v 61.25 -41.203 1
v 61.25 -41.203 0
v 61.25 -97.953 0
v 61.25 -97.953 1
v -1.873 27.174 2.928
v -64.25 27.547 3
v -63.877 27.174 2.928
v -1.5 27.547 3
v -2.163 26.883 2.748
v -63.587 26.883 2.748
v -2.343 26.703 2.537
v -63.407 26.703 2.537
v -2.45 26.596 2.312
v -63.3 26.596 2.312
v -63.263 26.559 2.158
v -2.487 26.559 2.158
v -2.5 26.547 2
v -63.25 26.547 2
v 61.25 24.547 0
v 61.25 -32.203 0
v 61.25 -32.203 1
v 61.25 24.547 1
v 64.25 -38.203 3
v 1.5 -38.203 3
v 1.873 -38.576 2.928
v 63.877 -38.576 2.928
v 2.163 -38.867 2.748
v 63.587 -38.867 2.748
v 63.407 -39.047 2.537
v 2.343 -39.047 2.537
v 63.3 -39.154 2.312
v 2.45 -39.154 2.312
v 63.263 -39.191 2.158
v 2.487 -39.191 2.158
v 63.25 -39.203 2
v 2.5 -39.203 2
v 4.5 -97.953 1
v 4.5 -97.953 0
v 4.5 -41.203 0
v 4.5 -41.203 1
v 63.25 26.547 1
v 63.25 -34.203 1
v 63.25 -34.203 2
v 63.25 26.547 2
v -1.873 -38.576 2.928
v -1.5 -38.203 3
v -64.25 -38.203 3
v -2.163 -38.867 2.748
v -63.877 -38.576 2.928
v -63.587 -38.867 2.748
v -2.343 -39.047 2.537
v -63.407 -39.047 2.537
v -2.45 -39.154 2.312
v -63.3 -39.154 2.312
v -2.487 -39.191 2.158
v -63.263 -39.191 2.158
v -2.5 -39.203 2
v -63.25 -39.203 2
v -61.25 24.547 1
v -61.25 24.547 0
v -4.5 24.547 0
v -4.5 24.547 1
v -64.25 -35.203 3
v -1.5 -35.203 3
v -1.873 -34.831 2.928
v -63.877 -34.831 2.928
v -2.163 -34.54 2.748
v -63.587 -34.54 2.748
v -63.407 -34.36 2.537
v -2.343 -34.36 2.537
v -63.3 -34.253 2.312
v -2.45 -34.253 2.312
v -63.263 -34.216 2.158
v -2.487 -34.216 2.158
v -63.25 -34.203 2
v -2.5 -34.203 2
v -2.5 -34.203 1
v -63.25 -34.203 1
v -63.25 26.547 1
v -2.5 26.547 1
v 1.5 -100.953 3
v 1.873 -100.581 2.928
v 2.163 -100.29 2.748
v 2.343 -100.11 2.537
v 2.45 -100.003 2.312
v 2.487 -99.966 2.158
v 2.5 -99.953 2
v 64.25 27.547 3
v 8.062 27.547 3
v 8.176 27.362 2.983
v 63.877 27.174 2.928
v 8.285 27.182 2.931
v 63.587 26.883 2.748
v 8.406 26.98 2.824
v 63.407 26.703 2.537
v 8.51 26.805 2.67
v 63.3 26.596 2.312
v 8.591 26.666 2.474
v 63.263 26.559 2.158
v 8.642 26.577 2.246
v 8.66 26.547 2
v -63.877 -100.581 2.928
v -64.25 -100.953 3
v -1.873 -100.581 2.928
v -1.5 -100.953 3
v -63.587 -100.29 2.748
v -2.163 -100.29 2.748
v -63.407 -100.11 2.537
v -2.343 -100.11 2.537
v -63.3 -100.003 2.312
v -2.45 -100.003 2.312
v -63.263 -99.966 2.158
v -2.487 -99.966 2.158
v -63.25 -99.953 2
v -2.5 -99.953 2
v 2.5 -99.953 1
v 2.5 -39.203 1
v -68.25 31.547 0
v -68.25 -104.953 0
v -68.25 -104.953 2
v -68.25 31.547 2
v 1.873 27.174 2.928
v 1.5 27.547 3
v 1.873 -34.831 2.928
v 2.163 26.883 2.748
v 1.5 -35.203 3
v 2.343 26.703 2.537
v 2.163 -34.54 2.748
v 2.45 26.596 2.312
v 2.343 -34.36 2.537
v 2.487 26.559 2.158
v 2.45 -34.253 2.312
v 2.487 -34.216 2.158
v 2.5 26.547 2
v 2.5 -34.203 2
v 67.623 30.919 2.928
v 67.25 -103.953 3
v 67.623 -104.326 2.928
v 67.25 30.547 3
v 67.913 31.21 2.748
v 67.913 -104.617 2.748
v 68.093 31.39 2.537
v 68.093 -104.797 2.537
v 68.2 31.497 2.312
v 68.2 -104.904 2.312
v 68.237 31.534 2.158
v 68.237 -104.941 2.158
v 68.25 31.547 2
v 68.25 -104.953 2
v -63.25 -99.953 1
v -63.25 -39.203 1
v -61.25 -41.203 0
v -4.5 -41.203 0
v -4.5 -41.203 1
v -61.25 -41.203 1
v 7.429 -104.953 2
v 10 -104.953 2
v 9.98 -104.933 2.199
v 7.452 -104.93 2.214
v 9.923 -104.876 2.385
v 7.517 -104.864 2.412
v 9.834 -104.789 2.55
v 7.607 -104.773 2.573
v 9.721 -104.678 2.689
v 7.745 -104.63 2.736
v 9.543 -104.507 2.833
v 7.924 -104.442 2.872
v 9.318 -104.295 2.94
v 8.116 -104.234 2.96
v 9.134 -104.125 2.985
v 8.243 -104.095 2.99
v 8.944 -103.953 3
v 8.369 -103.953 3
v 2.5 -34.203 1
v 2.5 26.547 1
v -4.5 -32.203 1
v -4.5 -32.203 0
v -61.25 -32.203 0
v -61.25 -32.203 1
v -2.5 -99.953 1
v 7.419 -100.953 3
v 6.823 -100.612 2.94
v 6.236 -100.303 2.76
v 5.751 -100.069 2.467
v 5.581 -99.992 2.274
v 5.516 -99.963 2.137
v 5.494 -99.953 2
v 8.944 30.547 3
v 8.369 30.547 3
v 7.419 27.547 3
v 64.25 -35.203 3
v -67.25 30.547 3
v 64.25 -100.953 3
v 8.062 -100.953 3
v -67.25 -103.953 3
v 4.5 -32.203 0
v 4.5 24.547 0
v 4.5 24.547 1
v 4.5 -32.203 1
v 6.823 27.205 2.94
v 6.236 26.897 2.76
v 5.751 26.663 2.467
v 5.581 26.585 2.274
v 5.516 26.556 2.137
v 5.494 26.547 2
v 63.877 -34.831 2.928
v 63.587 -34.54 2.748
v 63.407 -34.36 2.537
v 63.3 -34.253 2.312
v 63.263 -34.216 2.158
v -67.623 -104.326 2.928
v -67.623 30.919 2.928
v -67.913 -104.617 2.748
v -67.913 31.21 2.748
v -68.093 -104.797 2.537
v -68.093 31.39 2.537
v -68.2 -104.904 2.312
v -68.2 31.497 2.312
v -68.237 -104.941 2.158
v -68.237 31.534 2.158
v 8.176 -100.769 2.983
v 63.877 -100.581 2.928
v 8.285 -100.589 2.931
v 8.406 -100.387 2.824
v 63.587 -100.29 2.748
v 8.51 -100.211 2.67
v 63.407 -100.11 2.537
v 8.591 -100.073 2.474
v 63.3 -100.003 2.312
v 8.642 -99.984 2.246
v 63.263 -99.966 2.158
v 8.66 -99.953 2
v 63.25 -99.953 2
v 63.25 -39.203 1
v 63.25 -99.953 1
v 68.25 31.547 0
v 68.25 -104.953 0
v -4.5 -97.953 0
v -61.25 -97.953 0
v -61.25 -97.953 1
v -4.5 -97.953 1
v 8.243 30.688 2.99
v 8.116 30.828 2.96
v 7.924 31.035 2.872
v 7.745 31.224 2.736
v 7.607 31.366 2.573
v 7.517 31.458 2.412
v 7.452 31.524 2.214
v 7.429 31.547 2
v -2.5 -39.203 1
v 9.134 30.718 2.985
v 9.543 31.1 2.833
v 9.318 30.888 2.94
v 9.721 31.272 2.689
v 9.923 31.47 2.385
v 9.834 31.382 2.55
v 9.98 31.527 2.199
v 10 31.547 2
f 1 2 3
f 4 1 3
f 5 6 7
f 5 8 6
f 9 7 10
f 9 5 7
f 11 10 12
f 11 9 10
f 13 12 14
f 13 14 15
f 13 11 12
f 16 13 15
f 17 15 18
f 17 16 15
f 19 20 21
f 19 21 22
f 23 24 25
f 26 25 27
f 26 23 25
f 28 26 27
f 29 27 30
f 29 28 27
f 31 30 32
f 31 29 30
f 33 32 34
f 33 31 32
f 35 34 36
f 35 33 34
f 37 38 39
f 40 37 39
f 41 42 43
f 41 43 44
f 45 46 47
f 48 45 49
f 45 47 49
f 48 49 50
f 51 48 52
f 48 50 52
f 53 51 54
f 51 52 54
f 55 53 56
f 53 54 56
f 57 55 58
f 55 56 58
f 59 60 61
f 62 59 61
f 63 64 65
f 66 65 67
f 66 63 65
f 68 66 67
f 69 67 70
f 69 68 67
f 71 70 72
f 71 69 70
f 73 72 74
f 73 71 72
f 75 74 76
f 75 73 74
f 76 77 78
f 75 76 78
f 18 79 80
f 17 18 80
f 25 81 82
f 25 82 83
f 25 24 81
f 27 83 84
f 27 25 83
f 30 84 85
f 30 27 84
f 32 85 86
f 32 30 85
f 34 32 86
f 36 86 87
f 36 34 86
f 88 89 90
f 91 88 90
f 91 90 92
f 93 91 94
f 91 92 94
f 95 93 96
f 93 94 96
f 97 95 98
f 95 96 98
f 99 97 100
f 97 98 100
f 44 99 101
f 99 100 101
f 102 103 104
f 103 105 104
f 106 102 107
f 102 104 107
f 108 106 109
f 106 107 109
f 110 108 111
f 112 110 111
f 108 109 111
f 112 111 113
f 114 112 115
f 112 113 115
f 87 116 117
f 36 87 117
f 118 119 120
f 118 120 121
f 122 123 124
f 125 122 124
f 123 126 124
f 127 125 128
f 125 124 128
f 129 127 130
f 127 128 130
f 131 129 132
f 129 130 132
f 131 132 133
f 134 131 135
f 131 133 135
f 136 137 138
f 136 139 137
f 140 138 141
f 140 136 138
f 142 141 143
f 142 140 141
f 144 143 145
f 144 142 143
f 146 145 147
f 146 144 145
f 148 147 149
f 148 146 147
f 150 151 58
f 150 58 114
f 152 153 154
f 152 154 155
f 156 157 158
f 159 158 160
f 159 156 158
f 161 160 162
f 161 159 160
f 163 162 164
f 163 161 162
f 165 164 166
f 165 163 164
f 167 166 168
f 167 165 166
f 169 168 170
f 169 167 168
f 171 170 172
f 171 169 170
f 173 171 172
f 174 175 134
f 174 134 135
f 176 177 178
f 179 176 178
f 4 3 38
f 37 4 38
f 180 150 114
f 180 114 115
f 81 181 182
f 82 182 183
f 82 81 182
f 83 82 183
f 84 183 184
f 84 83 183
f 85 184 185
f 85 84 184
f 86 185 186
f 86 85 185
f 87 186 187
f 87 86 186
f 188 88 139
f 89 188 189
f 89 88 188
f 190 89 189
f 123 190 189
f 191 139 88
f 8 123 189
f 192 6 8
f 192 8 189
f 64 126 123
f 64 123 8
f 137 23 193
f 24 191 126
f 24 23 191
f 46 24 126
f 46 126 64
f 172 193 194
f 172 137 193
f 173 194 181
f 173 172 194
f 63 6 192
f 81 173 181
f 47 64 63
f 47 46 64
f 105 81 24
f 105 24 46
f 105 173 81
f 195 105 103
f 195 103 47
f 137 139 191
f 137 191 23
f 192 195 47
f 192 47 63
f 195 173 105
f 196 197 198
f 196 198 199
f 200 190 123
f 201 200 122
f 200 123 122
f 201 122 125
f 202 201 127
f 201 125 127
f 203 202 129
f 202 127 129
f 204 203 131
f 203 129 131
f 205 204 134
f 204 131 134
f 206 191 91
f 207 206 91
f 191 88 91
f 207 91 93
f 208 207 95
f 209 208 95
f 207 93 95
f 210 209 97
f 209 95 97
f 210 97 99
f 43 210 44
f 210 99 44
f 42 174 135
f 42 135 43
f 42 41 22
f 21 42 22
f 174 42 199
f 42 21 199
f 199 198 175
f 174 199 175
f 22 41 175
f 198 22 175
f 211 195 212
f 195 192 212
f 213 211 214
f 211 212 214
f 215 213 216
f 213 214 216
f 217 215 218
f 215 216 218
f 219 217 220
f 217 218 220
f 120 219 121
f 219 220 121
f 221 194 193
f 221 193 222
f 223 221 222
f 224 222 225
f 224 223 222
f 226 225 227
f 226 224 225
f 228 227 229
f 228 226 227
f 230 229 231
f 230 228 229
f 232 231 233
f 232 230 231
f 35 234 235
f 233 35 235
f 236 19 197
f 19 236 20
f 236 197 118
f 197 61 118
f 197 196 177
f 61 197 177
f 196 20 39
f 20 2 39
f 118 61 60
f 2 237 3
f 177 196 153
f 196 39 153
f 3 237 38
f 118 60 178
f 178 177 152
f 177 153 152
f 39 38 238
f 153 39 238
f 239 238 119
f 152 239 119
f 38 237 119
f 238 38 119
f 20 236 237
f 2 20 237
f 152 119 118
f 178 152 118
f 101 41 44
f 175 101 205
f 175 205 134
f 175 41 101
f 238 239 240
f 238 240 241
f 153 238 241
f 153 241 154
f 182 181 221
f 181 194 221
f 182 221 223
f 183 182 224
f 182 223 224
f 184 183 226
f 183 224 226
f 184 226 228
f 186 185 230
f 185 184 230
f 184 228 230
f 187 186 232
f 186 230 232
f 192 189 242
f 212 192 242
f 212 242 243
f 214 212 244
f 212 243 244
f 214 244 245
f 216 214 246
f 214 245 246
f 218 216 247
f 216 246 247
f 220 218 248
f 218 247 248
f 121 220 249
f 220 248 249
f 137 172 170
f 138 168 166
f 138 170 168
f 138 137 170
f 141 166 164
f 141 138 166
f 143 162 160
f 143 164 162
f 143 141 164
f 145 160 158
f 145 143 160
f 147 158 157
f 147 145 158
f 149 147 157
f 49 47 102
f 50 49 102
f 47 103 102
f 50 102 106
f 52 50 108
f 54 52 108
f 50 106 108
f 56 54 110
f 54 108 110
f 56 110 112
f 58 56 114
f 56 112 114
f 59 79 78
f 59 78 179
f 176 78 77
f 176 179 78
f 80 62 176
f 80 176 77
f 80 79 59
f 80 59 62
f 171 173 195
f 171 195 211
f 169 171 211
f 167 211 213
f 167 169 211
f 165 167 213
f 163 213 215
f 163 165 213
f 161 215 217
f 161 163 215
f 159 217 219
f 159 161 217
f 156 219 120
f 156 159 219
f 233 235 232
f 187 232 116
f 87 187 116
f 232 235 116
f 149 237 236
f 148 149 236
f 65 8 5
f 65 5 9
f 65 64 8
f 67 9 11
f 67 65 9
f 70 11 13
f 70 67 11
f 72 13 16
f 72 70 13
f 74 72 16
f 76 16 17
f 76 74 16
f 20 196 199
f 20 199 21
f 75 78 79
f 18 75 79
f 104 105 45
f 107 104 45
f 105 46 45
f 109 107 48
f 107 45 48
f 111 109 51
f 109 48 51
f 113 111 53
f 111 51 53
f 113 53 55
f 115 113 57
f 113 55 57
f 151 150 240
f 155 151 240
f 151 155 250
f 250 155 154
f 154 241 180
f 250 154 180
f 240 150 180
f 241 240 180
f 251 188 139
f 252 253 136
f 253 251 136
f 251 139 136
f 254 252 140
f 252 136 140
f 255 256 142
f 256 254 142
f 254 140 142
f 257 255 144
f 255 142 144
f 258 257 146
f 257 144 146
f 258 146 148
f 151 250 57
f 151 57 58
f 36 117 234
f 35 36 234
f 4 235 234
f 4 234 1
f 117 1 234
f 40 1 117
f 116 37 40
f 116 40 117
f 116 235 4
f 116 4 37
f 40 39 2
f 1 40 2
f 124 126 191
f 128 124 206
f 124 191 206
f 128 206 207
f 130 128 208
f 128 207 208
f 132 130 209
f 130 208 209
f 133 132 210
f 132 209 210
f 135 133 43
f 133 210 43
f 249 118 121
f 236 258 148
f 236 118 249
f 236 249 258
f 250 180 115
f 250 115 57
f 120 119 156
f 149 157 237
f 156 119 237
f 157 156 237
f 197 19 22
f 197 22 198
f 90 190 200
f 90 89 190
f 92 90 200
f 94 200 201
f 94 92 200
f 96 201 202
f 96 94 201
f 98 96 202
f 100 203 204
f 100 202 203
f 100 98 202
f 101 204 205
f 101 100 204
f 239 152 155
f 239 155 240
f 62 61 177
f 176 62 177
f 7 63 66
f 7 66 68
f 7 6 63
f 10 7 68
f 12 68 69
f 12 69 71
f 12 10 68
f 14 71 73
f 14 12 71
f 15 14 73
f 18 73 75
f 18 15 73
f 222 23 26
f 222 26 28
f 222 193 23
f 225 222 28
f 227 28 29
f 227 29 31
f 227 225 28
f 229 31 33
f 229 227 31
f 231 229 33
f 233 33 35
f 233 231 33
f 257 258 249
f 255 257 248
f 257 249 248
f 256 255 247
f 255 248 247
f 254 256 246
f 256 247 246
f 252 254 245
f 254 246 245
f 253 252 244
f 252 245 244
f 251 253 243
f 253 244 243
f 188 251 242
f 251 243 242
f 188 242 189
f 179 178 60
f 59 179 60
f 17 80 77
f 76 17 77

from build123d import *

# Parameters (mm, degrees)
F1_DEPTH = 3
F2_DEPTH = 1
F3_R     = 1
F3_2_R   = 1


# Not quite as in the source:
# - a feature names something its author has since deleted; it is built from what else it names


with BuildPart() as f1:
    # F0 (on Top) → F1 (new body)
    with BuildSketch(Plane.XY):
        with BuildLine():
            Line((-63.25, -34.2033516131), (-63.25, 26.5466483869))
            Line((-63.25, 26.5466483869), (-8.6602540378, 26.5466483869))
            ThreePointArc((-8.6602540378, 26.5466483869), (-9.6592582629, 28.9584579359), (-10, 31.5466483869))
            Line((-10, 31.5466483869), (-34.125, 31.5466483869))
            Line((-34.125, 31.5466483869), (-68.25, 31.5466483869))
            Line((-68.25, 31.5466483869), (-68.25, -36.7033516131))
            Line((-68.25, -36.7033516131), (0, -36.7033516131))
            Line((0, -36.7033516131), (0, 21.5466483869))
            ThreePointArc((0, 21.5466483869), (-1.2600429248, 21.6263514243), (-2.5, 21.8641900214))
            Line((-2.5, 21.8641900214), (-2.5, -34.2033516131))
            Line((-2.5, -34.2033516131), (-63.25, -34.2033516131))
        make_face()
        with BuildLine():
            ThreePointArc((-10, 31.5466483869), (-9.6592582629, 28.9584579359), (-8.6602540378, 26.5466483869))
            Line((-8.6602540378, 26.5466483869), (-5.4943754879, 26.5466483869))
            ThreePointArc((-5.4943754879, 26.5466483869), (-6.9283902407, 28.8660569086), (-7.4288735352, 31.5466483869))
            Line((-7.4288735352, 31.5466483869), (-10, 31.5466483869))
        make_face()
        with BuildLine():
            ThreePointArc((-7.4288735352, 31.5466483869), (-6.9283902407, 28.8660569086), (-5.4943754879, 26.5466483869))
            Line((-5.4943754879, 26.5466483869), (-2.5, 26.5466483869))
            Line((-2.5, 26.5466483869), (-2.5, 24.5510667812))
            ThreePointArc((-2.5, 24.5510667812), (-1.2686352802, 24.2268993115), (0, 24.1177748517))
            Line((0, 24.1177748517), (0, 31.5466483869))
            Line((0, 31.5466483869), (-7.4288735352, 31.5466483869))
        make_face()
        with BuildLine():
            ThreePointArc((0, 24.1177748517), (-1.2686352802, 24.2268993115), (-2.5, 24.5510667812))
            Line((-2.5, 24.5510667812), (-2.5, 21.8641900214))
            ThreePointArc((-2.5, 21.8641900214), (-1.2600429248, 21.6263514243), (0, 21.5466483869))
            Line((0, 21.5466483869), (0, 24.1177748517))
        make_face()
    extrude(amount=F1_DEPTH)

    # F0 (on Top) → F2 (join)
    with BuildSketch(Plane.XY):
        with BuildLine():
            Line((-8.6602540378, 26.5466483869), (-63.25, 26.5466483869))
            Line((-63.25, 26.5466483869), (-63.25, -34.2033516131))
            Line((-63.25, -34.2033516131), (-2.5, -34.2033516131))
            Line((-2.5, -34.2033516131), (-2.5, 21.8641900214))
            ThreePointArc((-2.5, 21.8641900214), (-3.5201478643, 22.1867039953), (-4.5, 22.6163628372))
            Line((-4.5, 22.6163628372), (-4.5, -32.2033516131))
            Line((-4.5, -32.2033516131), (-61.25, -32.2033516131))
            Line((-61.25, -32.2033516131), (-61.25, 24.5466483869))
            Line((-61.25, 24.5466483869), (-7.1414284285, 24.5466483869))
            ThreePointArc((-7.1414284285, 24.5466483869), (-7.9638741949, 25.4987803487), (-8.6602540378, 26.5466483869))
        make_face()
        with BuildLine():
            ThreePointArc((-10, 31.5466483869), (-9.6592582629, 28.9584579359), (-8.6602540378, 26.5466483869))
            Line((-8.6602540378, 26.5466483869), (-5.4943754879, 26.5466483869))
            ThreePointArc((-5.4943754879, 26.5466483869), (-6.9283902407, 28.8660569086), (-7.4288735352, 31.5466483869))
            Line((-7.4288735352, 31.5466483869), (-10, 31.5466483869))
        make_face()
        with BuildLine():
            Line((-5.4943754879, 26.5466483869), (-8.6602540378, 26.5466483869))
            ThreePointArc((-8.6602540378, 26.5466483869), (-7.9638741949, 25.4987803487), (-7.1414284285, 24.5466483869))
            Line((-7.1414284285, 24.5466483869), (-4.5, 24.5466483869))
            Line((-4.5, 24.5466483869), (-4.5, 22.6163628372))
            ThreePointArc((-4.5, 22.6163628372), (-3.5201478643, 22.1867039953), (-2.5, 21.8641900214))
            Line((-2.5, 21.8641900214), (-2.5, 24.5510667812))
            ThreePointArc((-2.5, 24.5510667812), (-4.1198417866, 25.364814868), (-5.4943754879, 26.5466483869))
        make_face()
        with BuildLine():
            Line((-2.5, 26.5466483869), (-5.4943754879, 26.5466483869))
            ThreePointArc((-5.4943754879, 26.5466483869), (-4.1198417866, 25.364814868), (-2.5, 24.5510667812))
            Line((-2.5, 24.5510667812), (-2.5, 26.5466483869))
        make_face()
    extrude(amount=F2_DEPTH)

    # F3
    f3_edges = [f1.edges().sort_by_distance(p)[0] for p in [
        (-32.875, 26.546648, 3),
        (-63.25, -3.828352, 3),
        (-32.875, -34.203352, 3),
        (-2.5, -3.828352, 3),
        (-34.125, 31.546648, 3),
        (-68.25, -2.578352, 3),
    ]]
    fillet(f3_edges, radius=F3_R)



with BuildPart() as f1b:
    # F0 (on Top) → F1, piece 2 (new body)
    with BuildSketch(Plane.XY):
        with BuildLine():
            ThreePointArc((8.6602540378, 26.5466483869), (9.6592582629, 28.9584579359), (10, 31.5466483869))
            Line((10, 31.5466483869), (7.4288735352, 31.5466483869))
            ThreePointArc((7.4288735352, 31.5466483869), (6.9283902407, 28.8660569086), (5.4943754879, 26.5466483869))
            Line((5.4943754879, 26.5466483869), (8.6602540378, 26.5466483869))
        make_face()
    extrude(amount=F1_DEPTH)

    # F0 (on Top) → F2, piece 2 (join)
    with BuildSketch(Plane.XY):
        with BuildLine():
            ThreePointArc((8.6602540378, 26.5466483869), (9.6592582629, 28.9584579359), (10, 31.5466483869))
            Line((10, 31.5466483869), (7.4288735352, 31.5466483869))
            ThreePointArc((7.4288735352, 31.5466483869), (6.9283902407, 28.8660569086), (5.4943754879, 26.5466483869))
            Line((5.4943754879, 26.5466483869), (8.6602540378, 26.5466483869))
        make_face()
    extrude(amount=F2_DEPTH)

    # F3#2
    f3_2_edges = [f1b.edges().sort_by_distance(p)[0] for p in [
        (9.659258, 28.958458, 3),
        (6.92839, 28.866057, 3),
        (7.077315, 26.546648, 3),
        (8.714437, 31.546648, 3),
    ]]
    fillet(f3_2_edges, radius=F3_2_R)


with BuildPart() as f1_1:
    add(f1.part)

    add(f1b.part)  # F4 merges F1b
    # F4: F1 across plane
    add(f1.part.mirror(Plane.YZ))

    # F5: F1 across face


with BuildPart() as f1_2:
    add(f1_1.part)
    add(f1_1.part.mirror(Plane(origin=(0, -36.7033516131, 1.4986605371), x_dir=(1, 0, 0), z_dir=(0, -1, 0))))


solid = f1_2.part
